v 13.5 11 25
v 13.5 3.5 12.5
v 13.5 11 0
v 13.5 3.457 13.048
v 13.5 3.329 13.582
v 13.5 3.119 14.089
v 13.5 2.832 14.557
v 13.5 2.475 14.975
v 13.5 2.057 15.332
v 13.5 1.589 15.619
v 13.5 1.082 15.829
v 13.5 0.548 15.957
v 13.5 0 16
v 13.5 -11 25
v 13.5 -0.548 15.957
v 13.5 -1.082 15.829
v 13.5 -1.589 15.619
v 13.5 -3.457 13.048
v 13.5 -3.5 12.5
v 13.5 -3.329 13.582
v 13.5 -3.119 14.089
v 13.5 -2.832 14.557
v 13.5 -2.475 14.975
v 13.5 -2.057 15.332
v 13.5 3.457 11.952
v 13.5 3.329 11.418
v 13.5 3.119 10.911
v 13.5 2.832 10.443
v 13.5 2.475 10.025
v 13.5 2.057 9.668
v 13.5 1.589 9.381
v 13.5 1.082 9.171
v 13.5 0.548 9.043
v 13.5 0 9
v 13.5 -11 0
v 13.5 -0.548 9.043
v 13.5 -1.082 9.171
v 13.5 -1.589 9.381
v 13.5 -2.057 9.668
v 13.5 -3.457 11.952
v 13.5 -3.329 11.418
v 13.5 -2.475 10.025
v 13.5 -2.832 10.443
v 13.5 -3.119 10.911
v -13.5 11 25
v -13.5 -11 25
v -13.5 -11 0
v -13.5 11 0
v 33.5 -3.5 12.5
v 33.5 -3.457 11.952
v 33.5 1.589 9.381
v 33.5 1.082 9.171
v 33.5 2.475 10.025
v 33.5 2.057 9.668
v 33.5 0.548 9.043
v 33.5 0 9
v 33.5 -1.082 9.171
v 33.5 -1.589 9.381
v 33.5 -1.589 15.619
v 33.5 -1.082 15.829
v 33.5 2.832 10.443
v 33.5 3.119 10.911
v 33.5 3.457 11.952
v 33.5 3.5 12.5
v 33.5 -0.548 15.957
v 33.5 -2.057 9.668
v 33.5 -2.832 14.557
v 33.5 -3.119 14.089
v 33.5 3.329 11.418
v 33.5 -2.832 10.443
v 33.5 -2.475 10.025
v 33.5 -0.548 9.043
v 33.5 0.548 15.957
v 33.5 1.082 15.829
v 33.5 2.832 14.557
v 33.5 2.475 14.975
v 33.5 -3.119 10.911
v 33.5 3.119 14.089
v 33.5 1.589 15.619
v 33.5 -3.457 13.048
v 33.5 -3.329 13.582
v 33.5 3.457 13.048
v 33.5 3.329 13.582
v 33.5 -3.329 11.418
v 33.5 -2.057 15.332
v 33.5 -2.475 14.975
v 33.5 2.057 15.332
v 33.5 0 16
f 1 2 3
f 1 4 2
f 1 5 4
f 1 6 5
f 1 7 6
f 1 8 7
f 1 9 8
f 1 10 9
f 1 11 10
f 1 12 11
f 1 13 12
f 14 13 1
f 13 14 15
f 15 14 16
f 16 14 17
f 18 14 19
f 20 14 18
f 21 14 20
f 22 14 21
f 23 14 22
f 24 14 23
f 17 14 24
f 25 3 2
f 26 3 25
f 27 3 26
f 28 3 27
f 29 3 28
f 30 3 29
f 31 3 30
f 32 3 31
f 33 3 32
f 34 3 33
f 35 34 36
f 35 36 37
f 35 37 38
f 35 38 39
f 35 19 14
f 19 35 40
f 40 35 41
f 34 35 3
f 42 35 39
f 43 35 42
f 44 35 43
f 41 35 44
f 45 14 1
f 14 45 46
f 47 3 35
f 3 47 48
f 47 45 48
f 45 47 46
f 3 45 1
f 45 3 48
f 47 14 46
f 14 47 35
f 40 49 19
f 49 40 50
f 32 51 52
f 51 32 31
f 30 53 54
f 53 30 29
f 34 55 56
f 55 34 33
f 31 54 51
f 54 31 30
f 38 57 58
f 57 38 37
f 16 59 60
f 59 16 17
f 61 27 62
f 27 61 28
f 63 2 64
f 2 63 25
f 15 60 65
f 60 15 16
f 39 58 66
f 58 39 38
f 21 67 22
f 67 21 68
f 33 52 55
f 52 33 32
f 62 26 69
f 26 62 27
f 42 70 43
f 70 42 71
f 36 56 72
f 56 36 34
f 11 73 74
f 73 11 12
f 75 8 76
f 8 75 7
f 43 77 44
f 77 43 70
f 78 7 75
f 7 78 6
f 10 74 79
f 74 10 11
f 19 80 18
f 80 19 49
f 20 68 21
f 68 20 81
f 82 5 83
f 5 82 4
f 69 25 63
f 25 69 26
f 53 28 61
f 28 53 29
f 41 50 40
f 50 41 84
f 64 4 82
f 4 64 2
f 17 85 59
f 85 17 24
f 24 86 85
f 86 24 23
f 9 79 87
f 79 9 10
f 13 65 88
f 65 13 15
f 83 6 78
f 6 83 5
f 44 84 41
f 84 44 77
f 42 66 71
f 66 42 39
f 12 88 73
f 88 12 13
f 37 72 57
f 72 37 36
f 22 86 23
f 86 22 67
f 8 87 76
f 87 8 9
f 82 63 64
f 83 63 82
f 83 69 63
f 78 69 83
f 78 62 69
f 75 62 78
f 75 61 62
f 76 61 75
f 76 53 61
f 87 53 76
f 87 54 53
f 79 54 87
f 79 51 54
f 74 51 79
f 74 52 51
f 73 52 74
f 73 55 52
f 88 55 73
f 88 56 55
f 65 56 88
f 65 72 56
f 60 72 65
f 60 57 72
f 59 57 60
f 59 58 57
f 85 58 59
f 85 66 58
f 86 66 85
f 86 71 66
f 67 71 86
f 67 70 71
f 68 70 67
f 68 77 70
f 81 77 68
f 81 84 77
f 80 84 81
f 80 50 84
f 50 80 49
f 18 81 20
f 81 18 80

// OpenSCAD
// file: formulas.scad
// Arm length function
function arm_length(l2, R, v) = 1/2*(sqrt(2)*sqrt(pow(l2, 2)*cos(2*v)-pow(l2, 2)+2*pow(R, 2))-2*l2*cos(v));
  
//Distance between 2 points
function distance(p1, p2) = sqrt(pow(p2[0]-p1[0], 2) + pow(p2[1]-p1[1], 2));

// Maximum distortion for angular x
function max_distortion(R, d1, d2) = R-sqrt(pow(R, 2) - pow((d2-d1), 2)/4);
  
// file: dimensions.scad
use <formulas.scad>;

$fn=40;

// Global
span_bottle=100; 
bottle_rod_diam=10; 
front_rod_diam=10; 
width=470;
span_bottom=160; // Bottom rods span
span_bottle=120; // Bottle rods span
board_thickness=6;
nut_t=6;
back_tilt_angle=20;

bushings_diam=15;
bushings_length=24;
bushings_hole_length=24.2;

strap_hole_dim=[4, 2];

// Bottle grip
bottle_axle_diam=8;
bottle_axle_pos=[span_bottom-sin(back_tilt_angle)*span_bottle/2, cos(back_tilt_angle)*span_bottle/2];

bottle_grip_bottom_diam=90;
bottle_grip_bottom_height=6;
bottle_grip_bottom_cone_height=4;

bottle_grip_top_diam=50;
bottle_grip_top_height=5;
bottle_grip_top_cone_height=20;
bottle_grip_top_diam=50;
bottle_grip_top_inner_diam=45;
bottle_pulley_teeth=62;


// Sides
holes_margin=25; 
axle_position=[0,0];
break_position=[70, 50];
axis_z=40;
bearing_extrusion_height=7.2;
bearing_extrusion_length=26;
bearing_axle_extrusion_height=20;
bearing_axle_extrusion_length=7.5;

//x_top_rod_position=[0,bottle_axle_pos[1] + x_rods_span/2];
bottom_extrusion_height=5;
bottle_top_rod_position=[span_bottom-sin(back_tilt_angle)*span_bottle, cos(back_tilt_angle)*span_bottle];

// Right side
bottle_axis_diam=15;
stepper_slide_distance=10;
a_stepper_pos=[span_bottom*0.4, 10];
stepper_rotation=atan((bottle_axle_pos[1]-a_stepper_pos[1])/(bottle_axle_pos[0]-a_stepper_pos[0]));
servo_distance_from_axle=50;

// Left side

// X table
x_a_distance=85;
x_table_tilt=0;
x_rods_span=50;
rod_ext=10;
table_rod_ext=10;
table_rods_diam=8;

// X stepper mount
x_stepper_mount_length = 40;
x_stepper_mount_width = x_rods_span + 10;

x_table_width=width+x_stepper_mount_length + 2*board_thickness;

// X carriage
//carriage_length= 24; // single bushing
carriage_length=65; // double bushings
carriage_height=x_rods_span+20;
carriage_rounding_radius = 10;
carriage_bushing_hole_width = 10.5;
z_rods_length=70;
z_rods_diam=8;
z_bar_width=20;
z_pos=-10;
z_bushings_diam=15;
z_bolt_diam=3;
z_rods_span=41;
z_bushings_pos = x_rods_span/2;
solenoid_dim = [27, 22, 25];
solenoid_pos=0;
plate_distance = sqrt(pow(bushings_diam/2, 2) - pow(carriage_bushing_hole_width/2, 2)) + board_thickness/2; // Calculates plate distance (depending on carriage_bushing_hole_width
echo("Plate distance:", plate_distance*2 + board_thickness);
z_plate_dist = 5;
z_bushings_hole_width = 2*sqrt(pow(bushings_diam/2, 2) - pow(z_plate_dist, 2));

// Calculations for x table position
xz_span = plate_distance + z_plate_dist + board_thickness/2;
x_top_rod_position=[bottle_axle_pos[0] - cos(x_table_tilt)*(x_a_distance) + sin(x_table_tilt)*(-xz_span), bottle_axle_pos[1] + sin(x_table_tilt)*(x_a_distance) + cos(x_table_tilt)*(-xz_span)];
x_btm_rod_position=[bottle_axle_pos[0] - cos(x_table_tilt)*(x_a_distance + x_rods_span) + sin(x_table_tilt)*(-xz_span), bottle_axle_pos[1] + sin(x_table_tilt)*(x_a_distance + x_rods_span) + cos(x_table_tilt)*(-xz_span)];

// Bottle
bottle_pos=30;
bottle_diam=100;
bottle_height=360;

// Bottle bar
bottle_bar_width=40;
bottle_bar_height=span_bottle;
bottle_bar_pos=bottle_height+bottle_pos+40;

bearing_hole_diam=13;
bearing_guide_diam=22;


// Pulley properties
shaftDiameter = 8; // the shaft at the center, will be subtracted from the pulley. Better be too small than too wide.
hubDiameter = 30; // if the hub or timing pulley is big enough to fit a nut, this will be embedded.
hubHeight = 8; // the hub is the thick cylinder connected to the pulley to allow a set screw to go through or as a collar for a nut.
flanges = 2; // the rims that keep the belt from going anywhere
hubSetScewDiameter = 0; // use either a set screw or nut on a shaft. Set to 0 to not use a set screw.
numSetScrews = 3;
bottle_pulley_teeth = ceil(7.1*16); // this value together with the pitch determines the pulley diameter
echo("Teeth:", bottle_pulley_teeth);

toothType = 1; // 1 = slightly rounded, 2 = oval sharp, 3 = square. For square, set the toothWith a little low.

// Belt properties:
pitch = 2; // distance between the teeth
beltWidth = 6; // the width/height of the belt. The (vertical) size of the pulley is adapted to this.
beltThickness = 0.65; // thickness of the part excluding the notch depth!
notchDepth = 0.8; // make it slightly bigger than actual, there's an outward curvature in the inner solid part of the pulley
toothWidth = 1.2; // Teeth of the PULLEY, that is.
// main file
include <dimensions.scad>;

module solenoid() {
  
  translate([0, 0, solenoid_dim[2]/2]) {
    color("darkblue") cube(solenoid_dim, center=true);
    translate([-solenoid_dim[0]/2, 0, 0]) rotate([0, 90, 0]) color("gray")  cylinder(r=7/2, h=47);
  }
  solenoid_holes();
}

module solenoid_holes() {
  translate([1, 0, 0]) {
    translate([14.5/2, -12.5/2, 0]) circle(3/2);
    translate([-14.5/2, 12.5/2, 0]) circle(3/2);
  }
}

solenoid();
  
